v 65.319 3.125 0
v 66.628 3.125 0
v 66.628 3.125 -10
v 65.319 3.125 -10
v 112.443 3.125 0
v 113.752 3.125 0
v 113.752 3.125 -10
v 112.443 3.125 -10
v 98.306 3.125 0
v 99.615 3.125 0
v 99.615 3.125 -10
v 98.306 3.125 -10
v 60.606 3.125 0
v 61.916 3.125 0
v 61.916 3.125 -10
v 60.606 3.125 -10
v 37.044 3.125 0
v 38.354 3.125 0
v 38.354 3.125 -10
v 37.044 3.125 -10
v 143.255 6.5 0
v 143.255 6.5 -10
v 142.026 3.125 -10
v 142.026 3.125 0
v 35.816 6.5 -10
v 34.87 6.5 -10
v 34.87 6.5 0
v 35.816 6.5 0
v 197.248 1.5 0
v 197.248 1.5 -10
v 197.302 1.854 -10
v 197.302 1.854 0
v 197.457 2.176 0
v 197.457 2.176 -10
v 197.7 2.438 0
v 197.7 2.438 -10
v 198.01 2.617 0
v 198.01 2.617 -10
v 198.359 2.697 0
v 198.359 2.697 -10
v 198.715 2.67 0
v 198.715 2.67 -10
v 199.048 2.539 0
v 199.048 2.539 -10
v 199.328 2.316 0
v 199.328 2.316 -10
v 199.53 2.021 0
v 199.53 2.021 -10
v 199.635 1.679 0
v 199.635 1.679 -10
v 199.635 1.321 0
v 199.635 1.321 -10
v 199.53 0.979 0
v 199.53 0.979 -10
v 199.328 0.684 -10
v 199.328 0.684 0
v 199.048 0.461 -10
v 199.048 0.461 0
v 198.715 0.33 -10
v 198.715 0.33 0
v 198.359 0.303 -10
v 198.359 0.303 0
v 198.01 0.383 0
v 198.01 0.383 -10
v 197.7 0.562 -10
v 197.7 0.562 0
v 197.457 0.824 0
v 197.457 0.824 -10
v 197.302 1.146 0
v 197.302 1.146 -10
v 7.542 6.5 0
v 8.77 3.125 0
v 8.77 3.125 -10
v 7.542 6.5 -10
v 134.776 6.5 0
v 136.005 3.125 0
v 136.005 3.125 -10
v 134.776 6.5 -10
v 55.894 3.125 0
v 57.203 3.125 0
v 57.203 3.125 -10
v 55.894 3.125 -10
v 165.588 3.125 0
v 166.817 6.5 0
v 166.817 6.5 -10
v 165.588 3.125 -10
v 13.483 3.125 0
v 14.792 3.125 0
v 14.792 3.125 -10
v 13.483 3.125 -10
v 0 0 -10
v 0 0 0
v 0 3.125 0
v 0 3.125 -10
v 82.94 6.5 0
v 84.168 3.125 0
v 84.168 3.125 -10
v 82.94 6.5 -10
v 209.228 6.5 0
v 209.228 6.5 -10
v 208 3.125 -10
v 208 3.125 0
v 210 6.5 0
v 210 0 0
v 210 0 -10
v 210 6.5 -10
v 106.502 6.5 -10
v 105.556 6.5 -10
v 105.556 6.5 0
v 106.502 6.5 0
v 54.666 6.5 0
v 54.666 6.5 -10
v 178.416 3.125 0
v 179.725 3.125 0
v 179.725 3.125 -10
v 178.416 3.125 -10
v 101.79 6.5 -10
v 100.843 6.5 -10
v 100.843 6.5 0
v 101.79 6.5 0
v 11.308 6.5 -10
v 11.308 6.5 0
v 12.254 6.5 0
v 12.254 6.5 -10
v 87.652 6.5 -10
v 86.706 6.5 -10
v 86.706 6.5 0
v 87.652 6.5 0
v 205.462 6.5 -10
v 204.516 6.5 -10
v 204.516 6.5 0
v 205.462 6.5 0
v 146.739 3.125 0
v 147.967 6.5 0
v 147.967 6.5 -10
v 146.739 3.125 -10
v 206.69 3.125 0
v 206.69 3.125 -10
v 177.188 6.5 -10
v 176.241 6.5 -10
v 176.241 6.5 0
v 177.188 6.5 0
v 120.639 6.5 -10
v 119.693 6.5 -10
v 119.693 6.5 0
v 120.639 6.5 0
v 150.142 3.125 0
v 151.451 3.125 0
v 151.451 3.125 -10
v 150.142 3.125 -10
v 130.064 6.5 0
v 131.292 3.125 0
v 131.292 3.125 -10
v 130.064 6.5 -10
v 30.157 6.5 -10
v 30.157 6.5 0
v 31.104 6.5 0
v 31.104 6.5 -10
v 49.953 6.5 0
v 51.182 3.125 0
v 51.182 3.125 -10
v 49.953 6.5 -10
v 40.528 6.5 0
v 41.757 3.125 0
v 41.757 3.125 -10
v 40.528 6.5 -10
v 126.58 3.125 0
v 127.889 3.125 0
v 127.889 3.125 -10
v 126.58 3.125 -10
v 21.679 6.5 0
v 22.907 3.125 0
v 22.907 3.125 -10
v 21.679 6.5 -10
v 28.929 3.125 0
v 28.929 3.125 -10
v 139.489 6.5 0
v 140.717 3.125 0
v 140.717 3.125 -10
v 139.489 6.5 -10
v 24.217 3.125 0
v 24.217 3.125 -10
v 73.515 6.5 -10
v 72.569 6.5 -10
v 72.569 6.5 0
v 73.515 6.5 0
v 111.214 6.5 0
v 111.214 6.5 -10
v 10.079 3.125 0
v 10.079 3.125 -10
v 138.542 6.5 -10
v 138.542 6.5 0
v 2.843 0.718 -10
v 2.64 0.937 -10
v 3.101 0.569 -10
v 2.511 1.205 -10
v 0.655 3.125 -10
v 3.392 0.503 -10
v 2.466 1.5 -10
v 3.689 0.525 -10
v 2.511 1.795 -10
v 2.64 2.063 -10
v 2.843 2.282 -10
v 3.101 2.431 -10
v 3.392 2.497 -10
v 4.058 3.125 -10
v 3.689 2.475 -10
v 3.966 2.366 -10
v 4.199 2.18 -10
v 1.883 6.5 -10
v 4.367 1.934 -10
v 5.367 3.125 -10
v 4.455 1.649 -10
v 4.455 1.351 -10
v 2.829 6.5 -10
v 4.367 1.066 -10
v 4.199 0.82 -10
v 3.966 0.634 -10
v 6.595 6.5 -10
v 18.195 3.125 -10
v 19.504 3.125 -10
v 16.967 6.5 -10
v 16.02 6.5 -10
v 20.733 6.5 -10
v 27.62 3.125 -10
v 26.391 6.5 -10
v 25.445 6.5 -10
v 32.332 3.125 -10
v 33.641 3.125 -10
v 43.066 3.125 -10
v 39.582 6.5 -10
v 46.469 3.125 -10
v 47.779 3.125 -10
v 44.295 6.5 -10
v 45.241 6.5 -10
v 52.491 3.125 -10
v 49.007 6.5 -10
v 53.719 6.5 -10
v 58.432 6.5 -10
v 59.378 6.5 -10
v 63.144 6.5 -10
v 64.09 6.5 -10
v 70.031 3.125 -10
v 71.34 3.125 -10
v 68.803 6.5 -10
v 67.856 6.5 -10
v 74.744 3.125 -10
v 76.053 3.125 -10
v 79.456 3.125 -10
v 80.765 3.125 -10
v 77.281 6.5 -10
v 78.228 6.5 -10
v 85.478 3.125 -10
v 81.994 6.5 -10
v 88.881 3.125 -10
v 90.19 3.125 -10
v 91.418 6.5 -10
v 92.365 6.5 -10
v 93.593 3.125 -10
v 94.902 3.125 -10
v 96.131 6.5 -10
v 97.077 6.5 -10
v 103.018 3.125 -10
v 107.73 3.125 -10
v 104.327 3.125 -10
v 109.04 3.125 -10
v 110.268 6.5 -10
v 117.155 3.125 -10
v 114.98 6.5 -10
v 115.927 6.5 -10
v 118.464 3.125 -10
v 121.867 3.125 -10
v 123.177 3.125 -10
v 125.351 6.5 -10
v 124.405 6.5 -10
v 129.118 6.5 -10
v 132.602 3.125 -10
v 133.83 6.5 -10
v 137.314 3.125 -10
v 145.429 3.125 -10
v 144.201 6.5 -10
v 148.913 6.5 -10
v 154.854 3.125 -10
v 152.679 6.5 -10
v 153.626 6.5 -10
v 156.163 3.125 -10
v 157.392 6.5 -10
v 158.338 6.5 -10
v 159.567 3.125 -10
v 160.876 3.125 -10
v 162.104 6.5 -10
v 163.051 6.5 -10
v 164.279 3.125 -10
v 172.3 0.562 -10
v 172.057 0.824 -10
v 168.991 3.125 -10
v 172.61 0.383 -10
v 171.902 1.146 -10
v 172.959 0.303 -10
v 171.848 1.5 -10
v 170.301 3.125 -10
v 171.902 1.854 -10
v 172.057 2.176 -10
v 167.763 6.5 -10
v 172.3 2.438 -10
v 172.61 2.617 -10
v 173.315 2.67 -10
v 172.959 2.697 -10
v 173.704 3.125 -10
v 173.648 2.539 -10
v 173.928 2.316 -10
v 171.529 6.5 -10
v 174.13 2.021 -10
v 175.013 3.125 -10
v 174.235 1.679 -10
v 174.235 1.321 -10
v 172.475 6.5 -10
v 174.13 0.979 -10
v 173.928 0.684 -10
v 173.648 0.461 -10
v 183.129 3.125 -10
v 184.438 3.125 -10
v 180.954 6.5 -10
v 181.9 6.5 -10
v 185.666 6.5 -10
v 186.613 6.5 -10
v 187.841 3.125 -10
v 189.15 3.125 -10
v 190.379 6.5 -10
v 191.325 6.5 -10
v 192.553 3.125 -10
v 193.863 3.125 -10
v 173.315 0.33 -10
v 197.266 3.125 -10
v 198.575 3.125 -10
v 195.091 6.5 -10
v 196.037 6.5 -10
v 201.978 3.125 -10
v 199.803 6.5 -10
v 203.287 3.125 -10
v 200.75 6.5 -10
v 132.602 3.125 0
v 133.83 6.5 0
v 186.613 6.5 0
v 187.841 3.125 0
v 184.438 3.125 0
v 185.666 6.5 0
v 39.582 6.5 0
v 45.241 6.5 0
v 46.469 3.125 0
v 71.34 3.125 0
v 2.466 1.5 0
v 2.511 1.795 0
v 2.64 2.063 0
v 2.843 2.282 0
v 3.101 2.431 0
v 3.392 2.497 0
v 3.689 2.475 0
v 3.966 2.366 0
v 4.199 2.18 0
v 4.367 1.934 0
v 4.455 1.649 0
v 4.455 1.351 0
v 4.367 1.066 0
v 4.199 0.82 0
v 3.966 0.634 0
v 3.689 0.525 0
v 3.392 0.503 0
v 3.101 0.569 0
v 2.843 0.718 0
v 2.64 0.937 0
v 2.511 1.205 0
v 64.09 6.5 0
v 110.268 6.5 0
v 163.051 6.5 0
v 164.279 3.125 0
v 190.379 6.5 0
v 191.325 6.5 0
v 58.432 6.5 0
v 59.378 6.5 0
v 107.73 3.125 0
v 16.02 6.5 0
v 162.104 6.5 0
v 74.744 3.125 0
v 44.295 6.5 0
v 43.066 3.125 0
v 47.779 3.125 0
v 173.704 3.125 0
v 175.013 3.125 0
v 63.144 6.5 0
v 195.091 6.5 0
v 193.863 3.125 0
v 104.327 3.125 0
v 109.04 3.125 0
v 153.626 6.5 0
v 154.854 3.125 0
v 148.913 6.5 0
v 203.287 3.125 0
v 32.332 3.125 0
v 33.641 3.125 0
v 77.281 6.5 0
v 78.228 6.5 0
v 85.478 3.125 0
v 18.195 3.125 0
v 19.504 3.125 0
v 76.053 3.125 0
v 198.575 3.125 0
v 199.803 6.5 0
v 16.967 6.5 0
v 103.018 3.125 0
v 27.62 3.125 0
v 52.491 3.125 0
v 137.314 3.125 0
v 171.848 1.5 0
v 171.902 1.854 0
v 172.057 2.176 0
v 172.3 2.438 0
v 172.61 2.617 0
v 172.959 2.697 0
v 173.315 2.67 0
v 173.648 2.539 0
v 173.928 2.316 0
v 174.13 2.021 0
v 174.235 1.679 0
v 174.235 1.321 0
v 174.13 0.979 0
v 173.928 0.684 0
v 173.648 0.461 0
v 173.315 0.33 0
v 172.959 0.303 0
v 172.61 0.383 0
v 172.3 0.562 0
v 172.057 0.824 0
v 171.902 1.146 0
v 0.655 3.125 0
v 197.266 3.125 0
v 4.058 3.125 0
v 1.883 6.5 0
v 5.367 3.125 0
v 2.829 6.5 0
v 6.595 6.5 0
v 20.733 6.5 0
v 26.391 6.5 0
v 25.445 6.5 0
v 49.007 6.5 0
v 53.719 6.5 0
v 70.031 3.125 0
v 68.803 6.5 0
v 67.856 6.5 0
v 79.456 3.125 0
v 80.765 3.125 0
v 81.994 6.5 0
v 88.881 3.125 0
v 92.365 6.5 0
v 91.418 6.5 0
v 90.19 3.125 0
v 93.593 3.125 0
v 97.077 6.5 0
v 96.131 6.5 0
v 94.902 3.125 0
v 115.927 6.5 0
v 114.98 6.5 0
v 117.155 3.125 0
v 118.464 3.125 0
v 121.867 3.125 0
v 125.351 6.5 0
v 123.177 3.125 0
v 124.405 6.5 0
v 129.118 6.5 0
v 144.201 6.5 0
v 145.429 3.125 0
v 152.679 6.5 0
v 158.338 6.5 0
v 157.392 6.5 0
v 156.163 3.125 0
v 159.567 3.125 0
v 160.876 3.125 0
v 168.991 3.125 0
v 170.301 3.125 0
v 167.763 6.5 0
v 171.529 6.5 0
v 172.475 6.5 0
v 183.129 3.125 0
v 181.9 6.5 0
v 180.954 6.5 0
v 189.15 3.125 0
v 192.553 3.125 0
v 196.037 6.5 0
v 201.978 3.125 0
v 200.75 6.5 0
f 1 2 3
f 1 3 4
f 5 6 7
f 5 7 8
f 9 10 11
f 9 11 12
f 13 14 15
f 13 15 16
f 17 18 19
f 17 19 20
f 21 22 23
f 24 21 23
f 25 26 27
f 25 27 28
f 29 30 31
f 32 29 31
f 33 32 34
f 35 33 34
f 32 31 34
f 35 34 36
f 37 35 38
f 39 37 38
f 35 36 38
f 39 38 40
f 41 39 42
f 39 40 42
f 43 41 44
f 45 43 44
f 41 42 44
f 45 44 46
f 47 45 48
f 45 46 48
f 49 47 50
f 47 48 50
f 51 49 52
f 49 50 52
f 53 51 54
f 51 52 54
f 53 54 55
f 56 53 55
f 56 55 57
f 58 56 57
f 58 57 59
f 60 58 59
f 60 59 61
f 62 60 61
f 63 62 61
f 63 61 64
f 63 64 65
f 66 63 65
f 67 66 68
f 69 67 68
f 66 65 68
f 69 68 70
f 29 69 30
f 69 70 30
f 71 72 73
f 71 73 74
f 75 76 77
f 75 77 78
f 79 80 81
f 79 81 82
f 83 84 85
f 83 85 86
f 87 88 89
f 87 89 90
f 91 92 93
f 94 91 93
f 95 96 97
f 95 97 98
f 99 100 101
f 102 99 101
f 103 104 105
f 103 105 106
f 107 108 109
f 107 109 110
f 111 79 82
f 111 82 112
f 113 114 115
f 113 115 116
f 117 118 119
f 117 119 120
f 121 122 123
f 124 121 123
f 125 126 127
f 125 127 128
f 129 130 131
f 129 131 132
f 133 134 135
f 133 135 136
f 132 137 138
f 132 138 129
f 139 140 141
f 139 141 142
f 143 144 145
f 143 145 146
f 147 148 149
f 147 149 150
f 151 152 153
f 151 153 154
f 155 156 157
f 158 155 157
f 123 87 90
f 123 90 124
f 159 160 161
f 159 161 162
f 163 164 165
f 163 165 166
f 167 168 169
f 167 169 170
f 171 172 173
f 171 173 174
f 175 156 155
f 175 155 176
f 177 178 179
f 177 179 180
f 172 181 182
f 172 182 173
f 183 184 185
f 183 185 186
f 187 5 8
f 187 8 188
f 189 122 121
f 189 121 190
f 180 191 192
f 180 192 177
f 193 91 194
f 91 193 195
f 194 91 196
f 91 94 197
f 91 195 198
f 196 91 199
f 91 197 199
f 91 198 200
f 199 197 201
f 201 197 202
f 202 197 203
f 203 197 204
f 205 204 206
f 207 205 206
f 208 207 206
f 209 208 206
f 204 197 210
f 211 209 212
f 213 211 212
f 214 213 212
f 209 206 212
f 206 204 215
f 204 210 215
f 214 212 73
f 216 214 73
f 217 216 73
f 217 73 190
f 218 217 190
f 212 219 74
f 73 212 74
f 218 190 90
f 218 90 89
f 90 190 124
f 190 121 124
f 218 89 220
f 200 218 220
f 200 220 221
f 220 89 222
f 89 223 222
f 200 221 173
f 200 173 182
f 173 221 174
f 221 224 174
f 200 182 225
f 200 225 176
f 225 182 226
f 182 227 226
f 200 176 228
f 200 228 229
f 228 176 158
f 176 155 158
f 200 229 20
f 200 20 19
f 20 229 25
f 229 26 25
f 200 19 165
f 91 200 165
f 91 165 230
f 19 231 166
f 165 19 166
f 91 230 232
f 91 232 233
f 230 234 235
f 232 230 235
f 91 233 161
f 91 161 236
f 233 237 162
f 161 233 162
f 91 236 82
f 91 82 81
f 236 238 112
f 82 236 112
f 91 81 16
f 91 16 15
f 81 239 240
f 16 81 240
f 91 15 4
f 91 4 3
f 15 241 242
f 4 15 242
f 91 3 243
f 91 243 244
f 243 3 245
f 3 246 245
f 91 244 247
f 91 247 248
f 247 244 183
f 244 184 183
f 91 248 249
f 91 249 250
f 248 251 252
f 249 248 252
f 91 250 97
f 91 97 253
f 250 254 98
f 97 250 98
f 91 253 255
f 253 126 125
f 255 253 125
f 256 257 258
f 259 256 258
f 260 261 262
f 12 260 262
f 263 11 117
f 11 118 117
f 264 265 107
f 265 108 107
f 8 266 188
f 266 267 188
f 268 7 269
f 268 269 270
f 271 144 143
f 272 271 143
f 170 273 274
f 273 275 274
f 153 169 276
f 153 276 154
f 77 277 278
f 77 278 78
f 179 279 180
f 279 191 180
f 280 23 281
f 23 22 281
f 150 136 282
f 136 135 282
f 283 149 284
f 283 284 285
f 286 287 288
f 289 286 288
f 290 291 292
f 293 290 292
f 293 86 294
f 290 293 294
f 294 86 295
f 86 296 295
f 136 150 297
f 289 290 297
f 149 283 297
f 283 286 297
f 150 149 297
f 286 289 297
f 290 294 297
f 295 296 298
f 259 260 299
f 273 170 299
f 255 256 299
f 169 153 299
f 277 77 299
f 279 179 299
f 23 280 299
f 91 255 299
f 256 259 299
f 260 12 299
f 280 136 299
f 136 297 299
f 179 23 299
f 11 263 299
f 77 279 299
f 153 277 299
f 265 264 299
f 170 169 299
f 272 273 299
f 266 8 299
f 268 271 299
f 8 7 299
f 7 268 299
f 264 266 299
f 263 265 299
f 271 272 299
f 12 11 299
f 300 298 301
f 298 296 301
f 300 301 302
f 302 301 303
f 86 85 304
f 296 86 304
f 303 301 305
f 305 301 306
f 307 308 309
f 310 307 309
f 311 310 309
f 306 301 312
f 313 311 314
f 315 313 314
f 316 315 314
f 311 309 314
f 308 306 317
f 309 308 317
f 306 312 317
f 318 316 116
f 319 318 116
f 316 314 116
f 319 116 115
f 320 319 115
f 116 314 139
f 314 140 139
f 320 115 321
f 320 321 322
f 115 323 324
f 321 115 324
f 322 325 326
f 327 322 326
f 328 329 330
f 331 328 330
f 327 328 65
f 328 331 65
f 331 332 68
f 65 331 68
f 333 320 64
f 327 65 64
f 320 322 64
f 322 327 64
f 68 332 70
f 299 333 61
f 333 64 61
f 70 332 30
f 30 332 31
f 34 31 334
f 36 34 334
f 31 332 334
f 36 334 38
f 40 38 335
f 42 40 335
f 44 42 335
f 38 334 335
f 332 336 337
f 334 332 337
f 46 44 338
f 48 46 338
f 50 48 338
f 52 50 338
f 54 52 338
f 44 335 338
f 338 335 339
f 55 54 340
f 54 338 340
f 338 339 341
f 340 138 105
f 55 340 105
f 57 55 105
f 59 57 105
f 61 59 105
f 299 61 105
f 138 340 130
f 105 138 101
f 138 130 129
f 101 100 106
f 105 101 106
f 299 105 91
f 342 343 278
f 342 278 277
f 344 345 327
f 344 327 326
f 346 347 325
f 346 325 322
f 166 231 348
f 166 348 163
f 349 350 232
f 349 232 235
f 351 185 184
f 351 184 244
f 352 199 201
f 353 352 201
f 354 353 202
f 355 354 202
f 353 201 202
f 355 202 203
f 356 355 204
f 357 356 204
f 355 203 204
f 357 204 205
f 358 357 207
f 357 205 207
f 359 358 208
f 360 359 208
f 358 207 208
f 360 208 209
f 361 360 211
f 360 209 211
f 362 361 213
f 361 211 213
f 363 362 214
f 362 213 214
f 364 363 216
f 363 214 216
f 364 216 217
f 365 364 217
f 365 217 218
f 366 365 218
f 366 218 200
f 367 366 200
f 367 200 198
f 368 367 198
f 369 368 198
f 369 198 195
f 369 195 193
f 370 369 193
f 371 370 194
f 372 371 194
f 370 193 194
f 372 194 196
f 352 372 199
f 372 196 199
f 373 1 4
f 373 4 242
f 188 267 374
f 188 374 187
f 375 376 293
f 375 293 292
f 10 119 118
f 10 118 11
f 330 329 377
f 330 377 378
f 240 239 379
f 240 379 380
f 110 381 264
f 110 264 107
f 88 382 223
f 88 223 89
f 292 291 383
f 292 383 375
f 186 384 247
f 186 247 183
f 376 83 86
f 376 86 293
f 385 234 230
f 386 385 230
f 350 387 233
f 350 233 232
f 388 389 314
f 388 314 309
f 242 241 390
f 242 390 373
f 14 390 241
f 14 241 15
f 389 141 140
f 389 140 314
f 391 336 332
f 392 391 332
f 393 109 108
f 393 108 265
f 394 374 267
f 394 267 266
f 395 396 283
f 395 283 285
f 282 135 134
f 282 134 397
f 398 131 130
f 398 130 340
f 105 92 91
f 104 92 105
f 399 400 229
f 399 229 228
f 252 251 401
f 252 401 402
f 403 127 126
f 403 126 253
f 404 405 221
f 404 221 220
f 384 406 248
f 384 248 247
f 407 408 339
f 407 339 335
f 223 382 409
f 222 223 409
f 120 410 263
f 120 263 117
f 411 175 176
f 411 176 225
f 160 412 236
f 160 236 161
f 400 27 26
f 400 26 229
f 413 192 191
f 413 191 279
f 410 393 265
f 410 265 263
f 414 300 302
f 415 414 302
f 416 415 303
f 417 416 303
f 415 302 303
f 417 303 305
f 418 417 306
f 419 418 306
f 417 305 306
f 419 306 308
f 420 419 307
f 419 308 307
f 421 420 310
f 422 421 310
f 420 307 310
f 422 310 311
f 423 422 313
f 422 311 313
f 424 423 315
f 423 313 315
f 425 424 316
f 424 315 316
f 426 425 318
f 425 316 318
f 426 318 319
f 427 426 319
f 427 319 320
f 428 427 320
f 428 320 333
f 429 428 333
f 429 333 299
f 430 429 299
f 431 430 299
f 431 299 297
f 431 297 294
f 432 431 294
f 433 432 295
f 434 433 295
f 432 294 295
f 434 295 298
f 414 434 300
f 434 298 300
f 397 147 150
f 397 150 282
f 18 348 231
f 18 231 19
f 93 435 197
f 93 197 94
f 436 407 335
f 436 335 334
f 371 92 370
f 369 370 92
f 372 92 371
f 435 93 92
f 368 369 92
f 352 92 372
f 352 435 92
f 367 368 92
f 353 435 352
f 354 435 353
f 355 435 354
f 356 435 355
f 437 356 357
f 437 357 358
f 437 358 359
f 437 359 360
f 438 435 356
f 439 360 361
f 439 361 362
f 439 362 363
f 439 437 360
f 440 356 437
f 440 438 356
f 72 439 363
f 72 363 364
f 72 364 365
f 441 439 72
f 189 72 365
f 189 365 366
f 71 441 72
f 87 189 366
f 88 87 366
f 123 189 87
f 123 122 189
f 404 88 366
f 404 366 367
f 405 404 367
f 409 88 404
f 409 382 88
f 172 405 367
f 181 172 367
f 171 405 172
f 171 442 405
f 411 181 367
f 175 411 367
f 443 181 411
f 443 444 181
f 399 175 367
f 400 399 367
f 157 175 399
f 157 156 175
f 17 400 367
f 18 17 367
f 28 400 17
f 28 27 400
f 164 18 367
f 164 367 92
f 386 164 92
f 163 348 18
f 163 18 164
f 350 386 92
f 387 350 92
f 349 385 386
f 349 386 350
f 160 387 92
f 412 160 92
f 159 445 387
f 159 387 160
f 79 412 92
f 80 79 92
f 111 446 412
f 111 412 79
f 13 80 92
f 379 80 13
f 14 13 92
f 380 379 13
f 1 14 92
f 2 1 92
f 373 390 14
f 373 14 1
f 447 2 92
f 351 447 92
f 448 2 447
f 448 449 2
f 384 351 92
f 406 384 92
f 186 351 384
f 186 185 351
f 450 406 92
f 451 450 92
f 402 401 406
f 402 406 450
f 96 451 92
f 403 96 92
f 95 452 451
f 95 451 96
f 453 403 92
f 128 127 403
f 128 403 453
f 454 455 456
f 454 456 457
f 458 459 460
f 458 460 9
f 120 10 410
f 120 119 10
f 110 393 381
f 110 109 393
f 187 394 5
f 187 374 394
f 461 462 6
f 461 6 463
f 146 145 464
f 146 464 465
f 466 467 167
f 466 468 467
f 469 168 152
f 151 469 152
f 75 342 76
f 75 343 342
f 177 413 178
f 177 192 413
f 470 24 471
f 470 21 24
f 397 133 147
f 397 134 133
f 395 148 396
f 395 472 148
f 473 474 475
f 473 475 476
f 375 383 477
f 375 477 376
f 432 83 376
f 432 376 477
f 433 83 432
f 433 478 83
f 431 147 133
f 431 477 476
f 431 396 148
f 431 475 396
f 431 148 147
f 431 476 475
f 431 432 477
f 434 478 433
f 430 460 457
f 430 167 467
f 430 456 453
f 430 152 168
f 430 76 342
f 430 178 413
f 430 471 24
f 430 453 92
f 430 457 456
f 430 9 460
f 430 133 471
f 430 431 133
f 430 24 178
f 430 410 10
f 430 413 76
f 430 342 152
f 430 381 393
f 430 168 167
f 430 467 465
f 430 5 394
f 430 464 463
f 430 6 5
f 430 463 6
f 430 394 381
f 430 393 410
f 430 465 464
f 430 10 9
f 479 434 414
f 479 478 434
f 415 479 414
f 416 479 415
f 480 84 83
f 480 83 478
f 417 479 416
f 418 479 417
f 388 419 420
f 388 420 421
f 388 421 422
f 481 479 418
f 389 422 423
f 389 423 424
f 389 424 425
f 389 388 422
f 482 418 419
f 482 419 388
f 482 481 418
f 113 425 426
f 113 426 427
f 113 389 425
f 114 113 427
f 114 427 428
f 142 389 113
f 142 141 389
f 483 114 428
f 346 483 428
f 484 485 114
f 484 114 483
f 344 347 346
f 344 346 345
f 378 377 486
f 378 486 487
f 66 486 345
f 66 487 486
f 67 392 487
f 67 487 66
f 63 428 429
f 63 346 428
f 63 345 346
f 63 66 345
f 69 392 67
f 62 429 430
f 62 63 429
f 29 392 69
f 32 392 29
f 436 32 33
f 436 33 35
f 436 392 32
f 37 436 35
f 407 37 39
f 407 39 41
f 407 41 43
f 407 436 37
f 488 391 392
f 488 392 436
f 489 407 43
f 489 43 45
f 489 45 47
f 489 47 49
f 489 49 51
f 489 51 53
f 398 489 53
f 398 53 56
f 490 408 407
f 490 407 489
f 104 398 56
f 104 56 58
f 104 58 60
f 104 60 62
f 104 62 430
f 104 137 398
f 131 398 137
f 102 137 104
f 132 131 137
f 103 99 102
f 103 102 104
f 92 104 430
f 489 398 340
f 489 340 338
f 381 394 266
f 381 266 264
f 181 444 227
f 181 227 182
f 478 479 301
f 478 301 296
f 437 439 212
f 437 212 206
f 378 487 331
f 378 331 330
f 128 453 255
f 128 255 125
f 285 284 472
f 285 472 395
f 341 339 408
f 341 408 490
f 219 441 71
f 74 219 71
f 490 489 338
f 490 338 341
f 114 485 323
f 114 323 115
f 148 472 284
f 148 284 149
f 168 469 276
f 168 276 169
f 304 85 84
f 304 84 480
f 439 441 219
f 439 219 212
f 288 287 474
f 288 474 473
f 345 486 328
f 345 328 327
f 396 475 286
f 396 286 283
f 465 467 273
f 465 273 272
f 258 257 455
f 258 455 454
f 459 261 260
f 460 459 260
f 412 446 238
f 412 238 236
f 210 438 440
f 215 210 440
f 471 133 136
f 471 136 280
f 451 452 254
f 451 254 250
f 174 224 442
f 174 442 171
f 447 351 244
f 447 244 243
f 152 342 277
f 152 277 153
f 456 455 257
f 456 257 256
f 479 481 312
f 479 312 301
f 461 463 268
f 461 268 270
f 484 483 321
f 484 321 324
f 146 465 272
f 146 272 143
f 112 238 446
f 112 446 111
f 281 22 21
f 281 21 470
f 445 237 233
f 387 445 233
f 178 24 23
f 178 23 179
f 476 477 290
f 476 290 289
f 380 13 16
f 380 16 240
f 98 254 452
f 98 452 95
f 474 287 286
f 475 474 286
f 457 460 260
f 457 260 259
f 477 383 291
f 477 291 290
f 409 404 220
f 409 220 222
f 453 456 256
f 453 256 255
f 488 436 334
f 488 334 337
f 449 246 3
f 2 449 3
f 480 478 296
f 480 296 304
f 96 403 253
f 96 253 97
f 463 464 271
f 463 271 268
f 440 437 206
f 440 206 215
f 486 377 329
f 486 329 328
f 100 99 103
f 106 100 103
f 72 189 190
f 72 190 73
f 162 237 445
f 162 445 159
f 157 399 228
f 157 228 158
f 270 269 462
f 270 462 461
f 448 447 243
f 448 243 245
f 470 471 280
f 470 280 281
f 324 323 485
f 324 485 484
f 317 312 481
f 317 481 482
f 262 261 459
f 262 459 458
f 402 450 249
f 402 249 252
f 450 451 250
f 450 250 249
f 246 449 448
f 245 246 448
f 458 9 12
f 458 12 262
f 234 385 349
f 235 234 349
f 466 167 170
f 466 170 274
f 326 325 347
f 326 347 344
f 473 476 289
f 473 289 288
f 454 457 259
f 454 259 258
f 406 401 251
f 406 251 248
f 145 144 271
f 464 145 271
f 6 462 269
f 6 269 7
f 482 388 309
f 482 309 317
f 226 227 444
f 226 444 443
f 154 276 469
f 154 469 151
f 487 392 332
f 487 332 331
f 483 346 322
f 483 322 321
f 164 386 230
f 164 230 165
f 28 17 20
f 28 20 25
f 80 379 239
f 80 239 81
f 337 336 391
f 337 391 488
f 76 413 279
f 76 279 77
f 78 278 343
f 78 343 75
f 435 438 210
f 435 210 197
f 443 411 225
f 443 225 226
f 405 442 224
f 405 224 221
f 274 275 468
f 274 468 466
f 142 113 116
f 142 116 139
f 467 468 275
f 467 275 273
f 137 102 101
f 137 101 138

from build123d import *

# Parameters (mm, degrees)
BLANKSKE_W         = 210
BLANKSKE_H         = 6.5
BLANK_DEPTH        = 10
TOOTHCUTSIM_DEPTH  = 211.338417794
TEETHCUTS_COUNT    = 45
TEETHCUTS_PITCH    = 4.712388975
SKETCH1_R          = 1
SKETCH1_R_2        = 1.2
CUT_EXTRUDE1_DEPTH = 10


with BuildPart() as part:
    # BlankSke → Blank (new body)
    with BuildSketch(Plane.XY):
        with Locations((105, 3.25)):
            Rectangle(BLANKSKE_W, BLANKSKE_H)
    extrude(amount=-BLANK_DEPTH)

    # TooCutSkeSim → ToothCutSim (cut, through all)
    with BuildSketch(Plane.XY):
        Polygon((0.654653055, 3.125), (-0.654653055, 3.125), (-1.892297439, 6.5254), (1.892297439, 6.5254), align=None)
    toothcutsim = extrude(amount=-TOOTHCUTSIM_DEPTH, mode=Mode.SUBTRACT)

    # TeethCuts: ToothCutSim ×45
    with Locations(*[(i * TEETHCUTS_PITCH, 0, 0) for i in range(1, TEETHCUTS_COUNT)]):
        add(toothcutsim, mode=Mode.SUBTRACT)

    # Sketch1 → Cut-Extrude1 (cut)
    with BuildSketch(Plane(origin=(0, 0, -10), x_dir=(-1, 0, 0), z_dir=(0, 0, -1))):
        with Locations((-3.466384229, 1.5)):
            Circle(SKETCH1_R)
        with Locations((-198.448420537, 1.5)):
            Circle(SKETCH1_R_2)
        with Locations((-173.048420537, 1.5)):
            Circle(SKETCH1_R_2)
    extrude(amount=-CUT_EXTRUDE1_DEPTH, mode=Mode.SUBTRACT)


solid = part.part
